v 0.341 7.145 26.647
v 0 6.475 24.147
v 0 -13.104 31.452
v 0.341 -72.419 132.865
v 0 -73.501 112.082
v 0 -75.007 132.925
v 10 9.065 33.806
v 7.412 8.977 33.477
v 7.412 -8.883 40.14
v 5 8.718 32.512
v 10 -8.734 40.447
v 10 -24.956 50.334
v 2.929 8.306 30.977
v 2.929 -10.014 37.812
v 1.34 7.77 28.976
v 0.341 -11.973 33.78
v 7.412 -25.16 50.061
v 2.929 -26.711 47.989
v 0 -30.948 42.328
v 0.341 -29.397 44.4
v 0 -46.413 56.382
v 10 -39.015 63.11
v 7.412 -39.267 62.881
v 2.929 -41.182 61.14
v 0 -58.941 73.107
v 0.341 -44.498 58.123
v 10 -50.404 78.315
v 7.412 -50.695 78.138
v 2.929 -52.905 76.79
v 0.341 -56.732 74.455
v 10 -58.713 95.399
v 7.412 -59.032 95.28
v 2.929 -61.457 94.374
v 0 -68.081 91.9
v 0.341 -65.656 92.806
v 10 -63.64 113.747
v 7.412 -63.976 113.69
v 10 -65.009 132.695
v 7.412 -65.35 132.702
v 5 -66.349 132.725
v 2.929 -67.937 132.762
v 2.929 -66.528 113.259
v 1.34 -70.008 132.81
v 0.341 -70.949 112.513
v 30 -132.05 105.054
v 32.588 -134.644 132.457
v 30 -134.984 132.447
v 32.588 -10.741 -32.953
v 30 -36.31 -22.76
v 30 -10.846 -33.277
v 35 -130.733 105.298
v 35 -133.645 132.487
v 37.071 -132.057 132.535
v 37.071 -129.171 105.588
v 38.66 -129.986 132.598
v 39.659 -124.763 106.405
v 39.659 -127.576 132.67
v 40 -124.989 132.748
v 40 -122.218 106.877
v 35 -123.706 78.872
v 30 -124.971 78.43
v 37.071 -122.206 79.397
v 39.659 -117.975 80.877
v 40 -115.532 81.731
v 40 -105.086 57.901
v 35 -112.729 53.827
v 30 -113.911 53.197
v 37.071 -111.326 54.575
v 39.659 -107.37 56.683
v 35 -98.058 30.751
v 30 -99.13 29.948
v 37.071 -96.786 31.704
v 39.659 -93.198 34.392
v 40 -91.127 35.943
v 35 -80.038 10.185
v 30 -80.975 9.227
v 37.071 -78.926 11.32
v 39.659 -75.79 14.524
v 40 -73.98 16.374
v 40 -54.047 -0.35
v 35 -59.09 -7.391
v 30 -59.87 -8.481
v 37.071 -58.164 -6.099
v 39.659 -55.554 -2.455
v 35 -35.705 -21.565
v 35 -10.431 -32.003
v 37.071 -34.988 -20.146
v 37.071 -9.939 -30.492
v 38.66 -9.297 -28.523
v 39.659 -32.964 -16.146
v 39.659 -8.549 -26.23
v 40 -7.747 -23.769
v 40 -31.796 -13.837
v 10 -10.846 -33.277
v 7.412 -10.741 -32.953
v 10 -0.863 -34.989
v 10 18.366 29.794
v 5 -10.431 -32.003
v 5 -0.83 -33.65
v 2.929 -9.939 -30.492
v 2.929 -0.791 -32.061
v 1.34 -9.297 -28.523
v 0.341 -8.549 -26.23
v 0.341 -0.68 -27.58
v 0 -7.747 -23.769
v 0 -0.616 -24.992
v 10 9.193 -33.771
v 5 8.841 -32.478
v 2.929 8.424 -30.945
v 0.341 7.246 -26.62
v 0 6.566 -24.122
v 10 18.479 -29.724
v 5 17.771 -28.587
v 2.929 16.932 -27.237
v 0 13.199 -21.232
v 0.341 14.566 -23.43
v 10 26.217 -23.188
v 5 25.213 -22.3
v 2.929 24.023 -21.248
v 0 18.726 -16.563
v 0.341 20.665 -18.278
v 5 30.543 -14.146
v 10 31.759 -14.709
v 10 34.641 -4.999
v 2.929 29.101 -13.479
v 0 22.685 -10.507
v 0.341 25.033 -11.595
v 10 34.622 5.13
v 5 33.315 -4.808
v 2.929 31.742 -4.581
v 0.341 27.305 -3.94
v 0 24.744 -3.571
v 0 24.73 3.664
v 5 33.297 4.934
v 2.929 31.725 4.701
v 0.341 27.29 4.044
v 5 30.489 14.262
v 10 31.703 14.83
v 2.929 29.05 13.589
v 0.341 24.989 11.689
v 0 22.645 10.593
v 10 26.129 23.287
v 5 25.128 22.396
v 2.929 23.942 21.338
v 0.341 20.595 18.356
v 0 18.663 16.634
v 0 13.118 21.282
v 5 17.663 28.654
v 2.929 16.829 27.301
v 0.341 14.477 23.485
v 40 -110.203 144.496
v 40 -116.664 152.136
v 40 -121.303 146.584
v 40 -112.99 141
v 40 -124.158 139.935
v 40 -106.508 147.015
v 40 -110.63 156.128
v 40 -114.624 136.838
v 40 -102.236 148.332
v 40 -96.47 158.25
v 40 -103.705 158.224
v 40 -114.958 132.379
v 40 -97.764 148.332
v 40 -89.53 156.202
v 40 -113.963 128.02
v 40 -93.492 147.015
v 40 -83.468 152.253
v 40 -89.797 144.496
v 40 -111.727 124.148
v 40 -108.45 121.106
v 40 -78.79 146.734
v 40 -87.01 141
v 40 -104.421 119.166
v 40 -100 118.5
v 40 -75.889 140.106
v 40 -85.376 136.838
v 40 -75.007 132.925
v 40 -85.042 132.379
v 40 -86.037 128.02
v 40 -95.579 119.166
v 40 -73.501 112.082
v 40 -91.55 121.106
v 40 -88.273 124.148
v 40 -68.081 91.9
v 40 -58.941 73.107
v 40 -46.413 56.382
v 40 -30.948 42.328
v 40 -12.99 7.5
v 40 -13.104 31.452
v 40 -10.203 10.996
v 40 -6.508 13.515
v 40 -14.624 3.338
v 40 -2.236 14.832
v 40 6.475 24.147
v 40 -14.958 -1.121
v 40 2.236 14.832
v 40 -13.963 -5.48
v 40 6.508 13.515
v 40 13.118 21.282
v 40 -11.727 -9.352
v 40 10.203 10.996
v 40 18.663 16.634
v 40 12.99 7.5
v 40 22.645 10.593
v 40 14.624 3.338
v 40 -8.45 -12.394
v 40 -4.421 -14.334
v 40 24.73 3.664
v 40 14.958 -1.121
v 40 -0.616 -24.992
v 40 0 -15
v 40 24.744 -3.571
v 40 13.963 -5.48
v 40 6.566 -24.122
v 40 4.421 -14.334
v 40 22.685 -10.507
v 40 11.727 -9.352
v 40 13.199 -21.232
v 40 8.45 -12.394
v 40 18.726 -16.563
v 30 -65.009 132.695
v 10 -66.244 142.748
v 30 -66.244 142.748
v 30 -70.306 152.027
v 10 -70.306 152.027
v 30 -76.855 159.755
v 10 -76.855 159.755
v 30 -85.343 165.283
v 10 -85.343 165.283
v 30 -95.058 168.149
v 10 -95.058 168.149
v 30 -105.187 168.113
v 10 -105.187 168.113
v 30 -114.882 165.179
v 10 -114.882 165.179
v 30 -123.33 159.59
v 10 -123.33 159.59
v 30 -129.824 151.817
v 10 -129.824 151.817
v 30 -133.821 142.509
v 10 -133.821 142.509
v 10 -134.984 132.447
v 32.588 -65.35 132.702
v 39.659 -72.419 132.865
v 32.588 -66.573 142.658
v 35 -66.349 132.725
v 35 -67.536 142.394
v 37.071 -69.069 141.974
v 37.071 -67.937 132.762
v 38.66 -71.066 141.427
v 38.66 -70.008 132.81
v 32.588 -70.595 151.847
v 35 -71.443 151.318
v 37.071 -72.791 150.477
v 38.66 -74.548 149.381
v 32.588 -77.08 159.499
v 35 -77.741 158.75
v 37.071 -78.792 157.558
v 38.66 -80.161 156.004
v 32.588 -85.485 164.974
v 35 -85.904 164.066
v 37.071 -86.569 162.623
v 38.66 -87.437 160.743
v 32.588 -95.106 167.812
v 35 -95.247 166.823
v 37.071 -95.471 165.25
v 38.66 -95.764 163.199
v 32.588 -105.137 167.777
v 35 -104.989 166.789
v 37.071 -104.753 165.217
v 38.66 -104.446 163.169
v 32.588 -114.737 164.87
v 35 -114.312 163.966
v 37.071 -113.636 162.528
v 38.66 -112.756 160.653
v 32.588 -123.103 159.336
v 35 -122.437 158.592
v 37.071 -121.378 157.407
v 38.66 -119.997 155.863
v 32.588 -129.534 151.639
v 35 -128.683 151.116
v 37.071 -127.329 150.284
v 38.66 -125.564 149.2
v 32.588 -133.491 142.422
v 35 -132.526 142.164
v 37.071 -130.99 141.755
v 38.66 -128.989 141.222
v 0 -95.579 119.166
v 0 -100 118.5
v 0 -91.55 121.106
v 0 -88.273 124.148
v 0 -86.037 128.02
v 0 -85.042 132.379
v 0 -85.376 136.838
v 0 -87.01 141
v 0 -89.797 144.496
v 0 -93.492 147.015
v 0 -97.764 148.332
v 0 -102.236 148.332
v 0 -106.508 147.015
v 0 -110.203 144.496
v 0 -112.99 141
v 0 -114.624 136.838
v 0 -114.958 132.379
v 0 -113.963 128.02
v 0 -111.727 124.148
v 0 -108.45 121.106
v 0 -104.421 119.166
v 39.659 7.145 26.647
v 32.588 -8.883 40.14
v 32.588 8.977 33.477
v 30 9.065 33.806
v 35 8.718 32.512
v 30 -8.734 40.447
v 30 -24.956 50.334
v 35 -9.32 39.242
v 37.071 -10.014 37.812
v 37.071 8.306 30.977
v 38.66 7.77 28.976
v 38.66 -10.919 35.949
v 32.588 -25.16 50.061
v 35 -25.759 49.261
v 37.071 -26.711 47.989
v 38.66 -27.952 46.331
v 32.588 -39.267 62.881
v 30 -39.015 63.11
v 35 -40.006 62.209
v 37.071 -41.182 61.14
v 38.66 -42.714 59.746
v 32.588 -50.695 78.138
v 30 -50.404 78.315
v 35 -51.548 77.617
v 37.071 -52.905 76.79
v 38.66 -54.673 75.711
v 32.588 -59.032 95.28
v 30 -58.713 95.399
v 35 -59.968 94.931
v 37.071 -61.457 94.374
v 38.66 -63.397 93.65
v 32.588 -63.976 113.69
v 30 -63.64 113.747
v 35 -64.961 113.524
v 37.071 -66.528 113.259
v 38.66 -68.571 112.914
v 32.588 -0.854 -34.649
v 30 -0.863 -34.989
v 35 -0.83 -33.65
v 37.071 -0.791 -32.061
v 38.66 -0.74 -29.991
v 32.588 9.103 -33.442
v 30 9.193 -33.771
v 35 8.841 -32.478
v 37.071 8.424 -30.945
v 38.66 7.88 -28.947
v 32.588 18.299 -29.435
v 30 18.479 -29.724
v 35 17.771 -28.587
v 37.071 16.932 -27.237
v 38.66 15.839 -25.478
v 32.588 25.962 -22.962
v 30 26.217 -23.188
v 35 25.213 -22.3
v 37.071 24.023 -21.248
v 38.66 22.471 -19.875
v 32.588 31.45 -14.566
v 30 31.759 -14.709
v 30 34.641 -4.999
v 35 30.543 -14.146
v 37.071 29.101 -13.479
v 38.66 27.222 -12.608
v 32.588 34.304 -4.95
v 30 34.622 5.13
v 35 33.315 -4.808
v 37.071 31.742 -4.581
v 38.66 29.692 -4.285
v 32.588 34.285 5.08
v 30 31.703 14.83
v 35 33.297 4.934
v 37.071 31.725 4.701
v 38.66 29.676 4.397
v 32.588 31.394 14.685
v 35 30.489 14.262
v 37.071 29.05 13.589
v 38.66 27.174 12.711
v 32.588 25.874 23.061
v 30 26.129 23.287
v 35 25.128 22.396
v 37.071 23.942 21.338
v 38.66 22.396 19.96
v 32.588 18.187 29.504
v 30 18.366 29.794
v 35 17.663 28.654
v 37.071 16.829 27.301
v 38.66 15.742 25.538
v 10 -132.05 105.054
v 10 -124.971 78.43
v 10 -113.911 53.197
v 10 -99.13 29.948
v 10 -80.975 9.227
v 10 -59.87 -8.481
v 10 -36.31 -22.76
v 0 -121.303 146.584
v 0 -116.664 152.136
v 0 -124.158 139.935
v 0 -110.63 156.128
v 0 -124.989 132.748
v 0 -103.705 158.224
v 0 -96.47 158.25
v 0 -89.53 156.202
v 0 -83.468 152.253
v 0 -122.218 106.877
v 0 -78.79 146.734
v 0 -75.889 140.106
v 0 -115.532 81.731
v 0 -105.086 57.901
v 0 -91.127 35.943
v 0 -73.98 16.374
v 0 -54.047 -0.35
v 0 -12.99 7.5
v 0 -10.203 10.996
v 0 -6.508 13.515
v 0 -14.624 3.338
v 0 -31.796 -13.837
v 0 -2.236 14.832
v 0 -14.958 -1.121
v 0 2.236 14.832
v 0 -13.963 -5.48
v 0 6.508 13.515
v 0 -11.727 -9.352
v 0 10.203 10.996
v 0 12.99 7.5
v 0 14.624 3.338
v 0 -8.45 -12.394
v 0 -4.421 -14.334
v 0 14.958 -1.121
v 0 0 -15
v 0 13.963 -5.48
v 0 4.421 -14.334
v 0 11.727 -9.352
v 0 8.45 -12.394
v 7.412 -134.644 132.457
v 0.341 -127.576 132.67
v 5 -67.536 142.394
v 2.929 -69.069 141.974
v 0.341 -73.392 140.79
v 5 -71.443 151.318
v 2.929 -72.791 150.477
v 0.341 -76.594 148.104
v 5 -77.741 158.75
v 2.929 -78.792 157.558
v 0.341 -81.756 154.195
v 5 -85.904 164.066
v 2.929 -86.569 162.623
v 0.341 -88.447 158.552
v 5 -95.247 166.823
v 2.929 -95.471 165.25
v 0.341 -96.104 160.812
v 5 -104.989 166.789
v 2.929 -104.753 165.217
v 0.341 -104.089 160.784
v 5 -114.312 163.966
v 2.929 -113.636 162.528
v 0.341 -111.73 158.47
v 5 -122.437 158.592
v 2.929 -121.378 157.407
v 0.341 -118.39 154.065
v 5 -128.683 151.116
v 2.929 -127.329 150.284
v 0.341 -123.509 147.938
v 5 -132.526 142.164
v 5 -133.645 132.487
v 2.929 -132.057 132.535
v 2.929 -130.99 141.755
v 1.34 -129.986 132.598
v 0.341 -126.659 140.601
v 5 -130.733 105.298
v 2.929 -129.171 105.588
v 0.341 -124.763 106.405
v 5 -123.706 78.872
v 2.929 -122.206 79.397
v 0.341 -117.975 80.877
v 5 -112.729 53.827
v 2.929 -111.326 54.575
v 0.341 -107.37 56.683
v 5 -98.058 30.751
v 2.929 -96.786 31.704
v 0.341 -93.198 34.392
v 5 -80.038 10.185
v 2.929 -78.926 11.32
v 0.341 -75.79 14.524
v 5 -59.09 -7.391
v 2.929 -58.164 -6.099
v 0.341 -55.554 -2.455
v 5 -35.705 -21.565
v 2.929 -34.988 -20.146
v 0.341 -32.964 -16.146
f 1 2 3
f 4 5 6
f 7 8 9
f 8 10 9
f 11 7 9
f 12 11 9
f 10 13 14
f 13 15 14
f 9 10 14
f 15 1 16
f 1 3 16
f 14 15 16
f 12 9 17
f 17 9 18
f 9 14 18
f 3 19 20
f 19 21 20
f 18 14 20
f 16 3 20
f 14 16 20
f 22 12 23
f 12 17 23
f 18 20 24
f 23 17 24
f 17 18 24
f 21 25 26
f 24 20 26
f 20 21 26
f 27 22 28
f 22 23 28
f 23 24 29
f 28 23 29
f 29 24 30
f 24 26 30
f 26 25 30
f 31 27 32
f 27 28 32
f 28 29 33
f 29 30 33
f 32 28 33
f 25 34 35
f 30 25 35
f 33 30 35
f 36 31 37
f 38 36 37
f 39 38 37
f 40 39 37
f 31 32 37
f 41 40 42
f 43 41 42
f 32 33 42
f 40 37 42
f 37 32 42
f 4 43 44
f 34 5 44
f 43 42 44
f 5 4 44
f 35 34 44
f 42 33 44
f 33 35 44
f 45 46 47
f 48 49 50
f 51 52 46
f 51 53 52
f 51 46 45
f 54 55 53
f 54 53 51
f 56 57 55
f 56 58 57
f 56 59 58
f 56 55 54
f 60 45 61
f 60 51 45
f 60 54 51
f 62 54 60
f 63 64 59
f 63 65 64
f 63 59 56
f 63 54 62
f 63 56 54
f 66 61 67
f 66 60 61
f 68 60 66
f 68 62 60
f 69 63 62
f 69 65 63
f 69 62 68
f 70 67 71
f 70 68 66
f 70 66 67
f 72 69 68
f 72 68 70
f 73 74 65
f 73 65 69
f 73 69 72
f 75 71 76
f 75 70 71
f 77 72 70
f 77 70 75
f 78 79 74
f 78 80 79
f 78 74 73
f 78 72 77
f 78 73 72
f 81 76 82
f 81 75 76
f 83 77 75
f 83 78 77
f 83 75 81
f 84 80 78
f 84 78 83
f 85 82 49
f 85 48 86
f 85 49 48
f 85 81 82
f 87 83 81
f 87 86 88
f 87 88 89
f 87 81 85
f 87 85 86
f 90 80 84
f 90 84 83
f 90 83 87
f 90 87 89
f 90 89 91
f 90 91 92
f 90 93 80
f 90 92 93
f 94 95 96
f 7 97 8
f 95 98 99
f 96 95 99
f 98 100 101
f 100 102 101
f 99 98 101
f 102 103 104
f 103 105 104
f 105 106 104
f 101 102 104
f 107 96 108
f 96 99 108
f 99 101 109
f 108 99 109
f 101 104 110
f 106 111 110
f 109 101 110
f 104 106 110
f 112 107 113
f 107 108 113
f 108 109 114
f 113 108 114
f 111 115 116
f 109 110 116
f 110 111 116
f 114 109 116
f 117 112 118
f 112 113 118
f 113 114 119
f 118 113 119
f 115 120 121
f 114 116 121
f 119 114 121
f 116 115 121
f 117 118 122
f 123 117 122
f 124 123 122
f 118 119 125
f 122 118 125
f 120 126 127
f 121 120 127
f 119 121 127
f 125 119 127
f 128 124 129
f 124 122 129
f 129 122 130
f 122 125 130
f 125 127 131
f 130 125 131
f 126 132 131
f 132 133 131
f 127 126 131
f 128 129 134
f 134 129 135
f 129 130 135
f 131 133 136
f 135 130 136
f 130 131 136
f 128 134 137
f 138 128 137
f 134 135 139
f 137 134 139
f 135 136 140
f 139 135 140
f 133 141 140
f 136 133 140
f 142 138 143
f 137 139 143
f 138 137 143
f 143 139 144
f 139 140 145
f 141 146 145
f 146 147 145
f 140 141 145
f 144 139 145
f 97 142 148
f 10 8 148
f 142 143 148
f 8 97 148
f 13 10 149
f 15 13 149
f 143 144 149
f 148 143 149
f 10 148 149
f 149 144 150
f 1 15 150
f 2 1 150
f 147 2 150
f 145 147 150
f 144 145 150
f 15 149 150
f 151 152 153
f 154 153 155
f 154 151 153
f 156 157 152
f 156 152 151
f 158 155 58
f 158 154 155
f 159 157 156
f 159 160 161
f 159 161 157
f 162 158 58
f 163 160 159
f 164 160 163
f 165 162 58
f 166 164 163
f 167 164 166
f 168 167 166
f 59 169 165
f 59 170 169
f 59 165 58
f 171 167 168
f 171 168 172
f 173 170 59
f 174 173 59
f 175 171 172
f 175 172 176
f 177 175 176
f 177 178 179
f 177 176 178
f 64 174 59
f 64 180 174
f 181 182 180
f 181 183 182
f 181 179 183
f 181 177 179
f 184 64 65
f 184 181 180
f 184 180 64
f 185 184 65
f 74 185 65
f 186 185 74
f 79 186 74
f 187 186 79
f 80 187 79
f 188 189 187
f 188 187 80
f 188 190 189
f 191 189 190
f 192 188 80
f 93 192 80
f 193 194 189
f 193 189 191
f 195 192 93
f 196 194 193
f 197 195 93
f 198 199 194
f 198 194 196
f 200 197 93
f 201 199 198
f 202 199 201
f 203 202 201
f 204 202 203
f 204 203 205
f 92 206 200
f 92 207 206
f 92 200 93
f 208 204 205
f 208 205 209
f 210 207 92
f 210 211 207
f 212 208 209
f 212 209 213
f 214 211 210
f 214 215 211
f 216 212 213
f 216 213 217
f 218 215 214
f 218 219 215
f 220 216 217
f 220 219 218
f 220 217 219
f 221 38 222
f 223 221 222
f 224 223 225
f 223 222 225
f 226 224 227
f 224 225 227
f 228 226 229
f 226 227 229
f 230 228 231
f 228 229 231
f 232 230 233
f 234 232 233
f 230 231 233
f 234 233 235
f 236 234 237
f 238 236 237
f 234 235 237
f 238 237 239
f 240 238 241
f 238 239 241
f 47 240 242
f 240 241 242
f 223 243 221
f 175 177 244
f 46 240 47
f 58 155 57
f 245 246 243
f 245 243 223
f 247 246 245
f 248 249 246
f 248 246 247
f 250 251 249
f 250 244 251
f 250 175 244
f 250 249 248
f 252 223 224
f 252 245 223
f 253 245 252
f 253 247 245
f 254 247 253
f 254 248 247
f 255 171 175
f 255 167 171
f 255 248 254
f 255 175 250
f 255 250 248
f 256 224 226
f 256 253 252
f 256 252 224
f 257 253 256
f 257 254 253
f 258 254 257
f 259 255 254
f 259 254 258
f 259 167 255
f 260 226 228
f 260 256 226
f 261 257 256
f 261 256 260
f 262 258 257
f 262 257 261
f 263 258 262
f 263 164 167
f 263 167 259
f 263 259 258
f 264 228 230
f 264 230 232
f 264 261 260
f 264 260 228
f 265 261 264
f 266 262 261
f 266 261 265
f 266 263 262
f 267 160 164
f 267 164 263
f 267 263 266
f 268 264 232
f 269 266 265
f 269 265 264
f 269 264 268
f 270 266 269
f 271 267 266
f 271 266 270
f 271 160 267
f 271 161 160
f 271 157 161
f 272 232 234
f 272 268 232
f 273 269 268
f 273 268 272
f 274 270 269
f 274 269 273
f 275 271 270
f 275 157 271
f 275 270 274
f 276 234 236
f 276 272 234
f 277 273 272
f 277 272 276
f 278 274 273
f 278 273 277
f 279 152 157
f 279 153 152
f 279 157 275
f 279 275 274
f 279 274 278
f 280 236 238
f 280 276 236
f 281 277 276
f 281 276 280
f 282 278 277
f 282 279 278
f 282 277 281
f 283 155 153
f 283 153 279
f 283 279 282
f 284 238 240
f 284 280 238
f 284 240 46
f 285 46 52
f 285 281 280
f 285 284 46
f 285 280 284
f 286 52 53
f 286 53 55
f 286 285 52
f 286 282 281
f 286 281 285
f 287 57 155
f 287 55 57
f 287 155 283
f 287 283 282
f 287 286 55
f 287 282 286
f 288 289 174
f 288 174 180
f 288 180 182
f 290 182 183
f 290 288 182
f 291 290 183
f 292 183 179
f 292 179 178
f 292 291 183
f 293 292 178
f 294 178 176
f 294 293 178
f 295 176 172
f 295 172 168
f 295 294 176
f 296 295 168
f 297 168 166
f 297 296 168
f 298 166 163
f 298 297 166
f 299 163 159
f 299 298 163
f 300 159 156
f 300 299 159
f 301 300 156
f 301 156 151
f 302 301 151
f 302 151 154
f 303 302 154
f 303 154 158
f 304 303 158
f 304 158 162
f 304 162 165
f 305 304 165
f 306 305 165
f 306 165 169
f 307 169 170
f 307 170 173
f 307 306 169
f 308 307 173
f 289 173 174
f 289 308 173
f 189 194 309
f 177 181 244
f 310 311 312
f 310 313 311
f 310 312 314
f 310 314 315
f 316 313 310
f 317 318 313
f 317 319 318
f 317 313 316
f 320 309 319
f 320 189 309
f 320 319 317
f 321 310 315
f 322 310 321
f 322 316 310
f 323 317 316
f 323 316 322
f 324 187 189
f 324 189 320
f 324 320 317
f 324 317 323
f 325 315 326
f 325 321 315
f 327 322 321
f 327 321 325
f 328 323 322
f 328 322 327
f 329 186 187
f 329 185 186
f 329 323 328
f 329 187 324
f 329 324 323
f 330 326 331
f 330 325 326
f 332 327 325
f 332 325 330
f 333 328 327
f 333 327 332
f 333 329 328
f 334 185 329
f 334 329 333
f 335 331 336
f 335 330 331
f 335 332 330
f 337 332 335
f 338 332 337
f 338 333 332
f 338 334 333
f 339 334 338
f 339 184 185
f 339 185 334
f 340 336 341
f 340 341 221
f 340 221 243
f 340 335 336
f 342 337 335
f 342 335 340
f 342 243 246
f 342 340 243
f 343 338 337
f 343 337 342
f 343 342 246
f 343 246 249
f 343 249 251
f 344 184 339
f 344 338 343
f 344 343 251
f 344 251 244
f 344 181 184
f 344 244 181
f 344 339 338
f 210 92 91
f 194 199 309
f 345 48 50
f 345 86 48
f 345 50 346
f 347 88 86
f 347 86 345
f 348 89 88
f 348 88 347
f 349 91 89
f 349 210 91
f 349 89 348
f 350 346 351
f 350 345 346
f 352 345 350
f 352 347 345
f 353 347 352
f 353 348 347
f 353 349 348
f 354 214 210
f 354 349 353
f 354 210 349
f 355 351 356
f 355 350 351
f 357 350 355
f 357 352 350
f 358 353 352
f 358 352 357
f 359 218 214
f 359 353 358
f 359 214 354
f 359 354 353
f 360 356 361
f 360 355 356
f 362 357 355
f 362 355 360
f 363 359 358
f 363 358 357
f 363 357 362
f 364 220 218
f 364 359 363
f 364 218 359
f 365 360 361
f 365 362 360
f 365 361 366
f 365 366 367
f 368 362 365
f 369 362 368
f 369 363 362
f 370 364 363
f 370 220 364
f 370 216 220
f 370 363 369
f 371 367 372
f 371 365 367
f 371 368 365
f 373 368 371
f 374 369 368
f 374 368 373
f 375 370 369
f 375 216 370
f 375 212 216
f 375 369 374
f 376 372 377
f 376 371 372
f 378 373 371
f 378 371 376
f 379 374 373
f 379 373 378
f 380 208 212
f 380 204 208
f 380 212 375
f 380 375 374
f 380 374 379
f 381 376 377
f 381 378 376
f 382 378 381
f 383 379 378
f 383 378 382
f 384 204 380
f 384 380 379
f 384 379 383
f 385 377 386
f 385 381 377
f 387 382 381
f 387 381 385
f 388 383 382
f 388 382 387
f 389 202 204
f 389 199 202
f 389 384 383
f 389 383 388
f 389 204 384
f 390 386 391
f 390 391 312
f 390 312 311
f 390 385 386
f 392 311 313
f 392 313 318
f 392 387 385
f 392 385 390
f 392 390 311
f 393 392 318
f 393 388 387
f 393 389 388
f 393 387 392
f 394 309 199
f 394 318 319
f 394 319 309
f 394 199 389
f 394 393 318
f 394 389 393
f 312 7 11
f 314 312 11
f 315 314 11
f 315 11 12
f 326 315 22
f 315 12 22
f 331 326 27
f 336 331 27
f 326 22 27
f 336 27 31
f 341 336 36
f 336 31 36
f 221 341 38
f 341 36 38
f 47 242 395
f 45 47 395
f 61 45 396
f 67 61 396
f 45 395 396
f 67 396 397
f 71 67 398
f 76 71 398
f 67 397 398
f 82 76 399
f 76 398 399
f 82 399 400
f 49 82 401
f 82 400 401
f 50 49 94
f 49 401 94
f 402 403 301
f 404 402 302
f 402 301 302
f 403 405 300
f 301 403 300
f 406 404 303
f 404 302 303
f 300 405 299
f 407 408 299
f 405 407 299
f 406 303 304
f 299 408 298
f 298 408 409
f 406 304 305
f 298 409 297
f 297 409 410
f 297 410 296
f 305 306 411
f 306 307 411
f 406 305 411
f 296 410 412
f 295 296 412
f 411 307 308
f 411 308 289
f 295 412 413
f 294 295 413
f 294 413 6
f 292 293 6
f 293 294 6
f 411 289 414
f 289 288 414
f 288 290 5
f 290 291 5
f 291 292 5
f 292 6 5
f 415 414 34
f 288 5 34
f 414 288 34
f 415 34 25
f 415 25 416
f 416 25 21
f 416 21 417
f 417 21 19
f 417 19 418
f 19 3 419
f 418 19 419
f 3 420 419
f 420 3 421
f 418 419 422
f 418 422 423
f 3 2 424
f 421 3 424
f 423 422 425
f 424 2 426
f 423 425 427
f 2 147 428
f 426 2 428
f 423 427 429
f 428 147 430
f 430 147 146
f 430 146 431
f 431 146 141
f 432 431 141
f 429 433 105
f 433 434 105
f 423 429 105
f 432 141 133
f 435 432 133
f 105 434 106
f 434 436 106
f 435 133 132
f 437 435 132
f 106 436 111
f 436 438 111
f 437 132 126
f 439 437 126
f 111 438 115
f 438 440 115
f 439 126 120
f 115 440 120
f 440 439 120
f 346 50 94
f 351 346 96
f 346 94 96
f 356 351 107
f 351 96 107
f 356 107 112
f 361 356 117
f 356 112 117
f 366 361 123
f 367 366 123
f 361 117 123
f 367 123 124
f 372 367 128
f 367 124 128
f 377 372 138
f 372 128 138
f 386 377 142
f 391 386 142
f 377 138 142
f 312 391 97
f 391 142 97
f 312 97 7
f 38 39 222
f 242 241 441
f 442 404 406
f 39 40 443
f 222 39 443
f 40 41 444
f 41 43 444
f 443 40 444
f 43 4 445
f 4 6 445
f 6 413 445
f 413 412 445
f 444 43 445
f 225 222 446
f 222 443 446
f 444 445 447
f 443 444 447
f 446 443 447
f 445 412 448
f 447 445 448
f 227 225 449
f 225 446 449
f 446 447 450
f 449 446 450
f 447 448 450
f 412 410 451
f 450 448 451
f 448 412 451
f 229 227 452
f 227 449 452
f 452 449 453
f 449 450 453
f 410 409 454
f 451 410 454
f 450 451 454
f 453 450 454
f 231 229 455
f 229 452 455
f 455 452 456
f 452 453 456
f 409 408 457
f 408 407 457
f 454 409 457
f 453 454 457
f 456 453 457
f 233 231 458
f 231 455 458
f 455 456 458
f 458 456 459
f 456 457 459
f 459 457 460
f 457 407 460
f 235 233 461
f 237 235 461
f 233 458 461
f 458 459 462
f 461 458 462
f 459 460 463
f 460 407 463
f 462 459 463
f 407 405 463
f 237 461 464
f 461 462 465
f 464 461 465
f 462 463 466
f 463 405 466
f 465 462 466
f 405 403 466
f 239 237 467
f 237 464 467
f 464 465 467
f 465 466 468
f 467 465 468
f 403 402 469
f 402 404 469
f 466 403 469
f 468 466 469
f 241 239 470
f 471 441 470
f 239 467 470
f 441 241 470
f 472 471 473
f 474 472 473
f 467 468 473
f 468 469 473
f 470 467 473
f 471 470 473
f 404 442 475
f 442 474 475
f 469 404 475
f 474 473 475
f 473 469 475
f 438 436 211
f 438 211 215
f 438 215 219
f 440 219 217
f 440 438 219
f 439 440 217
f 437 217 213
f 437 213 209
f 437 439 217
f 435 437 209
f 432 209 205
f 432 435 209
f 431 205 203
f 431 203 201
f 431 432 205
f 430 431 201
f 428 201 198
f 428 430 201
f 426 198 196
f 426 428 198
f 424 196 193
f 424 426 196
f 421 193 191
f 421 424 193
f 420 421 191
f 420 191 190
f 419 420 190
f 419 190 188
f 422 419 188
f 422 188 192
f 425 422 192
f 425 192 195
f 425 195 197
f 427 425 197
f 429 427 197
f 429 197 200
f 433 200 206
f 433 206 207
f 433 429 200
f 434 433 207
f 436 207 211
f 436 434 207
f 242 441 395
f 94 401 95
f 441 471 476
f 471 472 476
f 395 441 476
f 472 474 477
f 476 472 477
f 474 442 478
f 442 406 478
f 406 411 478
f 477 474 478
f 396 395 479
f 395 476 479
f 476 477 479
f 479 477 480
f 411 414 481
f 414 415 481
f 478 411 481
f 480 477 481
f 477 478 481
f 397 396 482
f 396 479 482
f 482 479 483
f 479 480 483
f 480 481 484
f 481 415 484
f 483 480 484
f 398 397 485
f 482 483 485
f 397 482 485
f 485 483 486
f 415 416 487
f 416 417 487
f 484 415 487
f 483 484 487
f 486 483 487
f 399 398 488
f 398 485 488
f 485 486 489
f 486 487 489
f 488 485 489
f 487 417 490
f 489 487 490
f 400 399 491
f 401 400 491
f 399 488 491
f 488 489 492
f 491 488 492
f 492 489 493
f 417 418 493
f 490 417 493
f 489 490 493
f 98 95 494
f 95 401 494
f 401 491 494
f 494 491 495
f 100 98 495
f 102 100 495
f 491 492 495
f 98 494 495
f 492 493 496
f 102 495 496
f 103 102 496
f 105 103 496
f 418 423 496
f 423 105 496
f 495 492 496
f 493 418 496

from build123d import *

# Parameters (mm, degrees)
SKETCH1_R           = 15
BOSS_EXTRUDE1_DEPTH = 40
FILLET1_R           = 10


with BuildPart() as part:
    # Sketch1 → Boss-Extrude1 (new body)
    with BuildSketch(Plane(origin=(0, 0, 0), x_dir=(0, 0, -1), z_dir=(1, 0, 0))):
        with BuildLine():
            ThreePointArc((33.277008782, -10.846229138), (9.959027872, 33.553207952), (-33.805757942, 9.064807223))
            ThreePointArc((-33.805757942, 9.064807223), (-70.44161018, -45.071700409), (-132.694646831, -65.009266851))
            ThreePointArc((-132.694646831, -65.009266851), (-168.499781041, -100.12380247), (-132.447129149, -134.984160172))
            ThreePointArc((-132.447129149, -134.984160172), (-29.948243855, -99.130344454), (33.277008782, -10.846229138))
        make_face()
        Circle(SKETCH1_R, mode=Mode.SUBTRACT)
        with Locations((-133.5, -100)):
            Circle(SKETCH1_R, mode=Mode.SUBTRACT)
    extrude(amount=BOSS_EXTRUDE1_DEPTH)

    # Fillet1
    fillet1_edges = [part.edges().sort_by_distance(p)[0] for p in [
        (40, -45.071700409, 70.44161018),
        (40, -100.12380247, 168.499781041),
        (40, -99.130344454, 29.948243855),
        (0, -100.12380247, 168.499781041),
        (0, -45.071700409, 70.44161018),
        (0, 33.553207952, -9.959027872),
        (0, -99.130344454, 29.948243855),
        (40, 33.553207952, -9.959027872),
    ]]
    fillet(fillet1_edges, radius=FILLET1_R)


solid = part.part
